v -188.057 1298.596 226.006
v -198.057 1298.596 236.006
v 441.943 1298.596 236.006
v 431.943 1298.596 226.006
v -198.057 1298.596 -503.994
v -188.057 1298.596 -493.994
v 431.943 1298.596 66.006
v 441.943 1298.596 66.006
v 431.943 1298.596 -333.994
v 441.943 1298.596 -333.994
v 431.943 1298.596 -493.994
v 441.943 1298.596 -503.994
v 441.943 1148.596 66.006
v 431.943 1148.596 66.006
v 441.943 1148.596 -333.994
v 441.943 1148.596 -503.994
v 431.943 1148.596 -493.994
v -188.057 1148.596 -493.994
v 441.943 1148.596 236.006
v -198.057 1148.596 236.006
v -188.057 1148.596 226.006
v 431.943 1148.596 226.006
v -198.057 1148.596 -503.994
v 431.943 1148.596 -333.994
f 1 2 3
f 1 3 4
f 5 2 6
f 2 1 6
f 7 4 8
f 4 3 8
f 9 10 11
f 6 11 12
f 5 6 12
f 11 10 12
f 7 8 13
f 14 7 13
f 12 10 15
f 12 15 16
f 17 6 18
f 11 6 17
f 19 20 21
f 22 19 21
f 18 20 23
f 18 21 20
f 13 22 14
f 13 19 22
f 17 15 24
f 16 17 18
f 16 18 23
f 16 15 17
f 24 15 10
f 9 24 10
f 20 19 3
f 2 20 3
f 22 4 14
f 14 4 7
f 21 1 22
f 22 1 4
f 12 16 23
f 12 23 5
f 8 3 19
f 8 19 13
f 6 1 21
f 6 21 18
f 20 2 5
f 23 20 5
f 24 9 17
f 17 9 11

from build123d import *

# Parameters (mm, degrees)
SKETCH1_W                = 740
SKETCH1_H                = 150
BOSS_EXTRUDE1_DEPTH      = 441.94307
BOSS_EXTRUDE1_DEPTH_BACK = 198.05693
SKETCH2_W                = 620
SKETCH2_H                = 720
CUT_EXTRUDE1_DEPTH       = 150
CUT_EXTRUDE2_DEPTH       = 630


with BuildPart() as part:
    # Sketch1 → Boss-Extrude1 (new body, two sides)
    with BuildSketch(Plane(origin=(0, 0, 0), x_dir=(0, 0, -1), z_dir=(1, 0, 0))) as boss_extrude1_sk:
        with Locations((133.994417004, 1223.59608297)):
            Rectangle(SKETCH1_W, SKETCH1_H)
    extrude(amount=BOSS_EXTRUDE1_DEPTH)
    extrude(boss_extrude1_sk.sketch, amount=-BOSS_EXTRUDE1_DEPTH_BACK)

    # Sketch2 → Cut-Extrude1 (cut)
    with BuildSketch(Plane(origin=(0, 1298.59608297, 0), x_dir=(1, 0, 0), z_dir=(0, 1, 0))):
        with Locations((121.943070464, 133.994417004)):
            Rectangle(SKETCH2_W, SKETCH2_H)
    extrude(amount=-CUT_EXTRUDE1_DEPTH, mode=Mode.SUBTRACT)

    # Sketch3 → Cut-Extrude2 (cut)
    with BuildSketch(Plane(origin=(441.943070464, 0, 0), x_dir=(0, 0, -1), z_dir=(1, 0, 0))):
        Polygon((133.994417004, 1148.59608297), (333.994417004, 1148.59608297), (333.994417004, 1298.59608297), (-66.005582996, 1298.59608297), (-66.005582996, 1148.59608297), align=None)
    extrude(amount=-CUT_EXTRUDE2_DEPTH, mode=Mode.SUBTRACT)


solid = part.part
